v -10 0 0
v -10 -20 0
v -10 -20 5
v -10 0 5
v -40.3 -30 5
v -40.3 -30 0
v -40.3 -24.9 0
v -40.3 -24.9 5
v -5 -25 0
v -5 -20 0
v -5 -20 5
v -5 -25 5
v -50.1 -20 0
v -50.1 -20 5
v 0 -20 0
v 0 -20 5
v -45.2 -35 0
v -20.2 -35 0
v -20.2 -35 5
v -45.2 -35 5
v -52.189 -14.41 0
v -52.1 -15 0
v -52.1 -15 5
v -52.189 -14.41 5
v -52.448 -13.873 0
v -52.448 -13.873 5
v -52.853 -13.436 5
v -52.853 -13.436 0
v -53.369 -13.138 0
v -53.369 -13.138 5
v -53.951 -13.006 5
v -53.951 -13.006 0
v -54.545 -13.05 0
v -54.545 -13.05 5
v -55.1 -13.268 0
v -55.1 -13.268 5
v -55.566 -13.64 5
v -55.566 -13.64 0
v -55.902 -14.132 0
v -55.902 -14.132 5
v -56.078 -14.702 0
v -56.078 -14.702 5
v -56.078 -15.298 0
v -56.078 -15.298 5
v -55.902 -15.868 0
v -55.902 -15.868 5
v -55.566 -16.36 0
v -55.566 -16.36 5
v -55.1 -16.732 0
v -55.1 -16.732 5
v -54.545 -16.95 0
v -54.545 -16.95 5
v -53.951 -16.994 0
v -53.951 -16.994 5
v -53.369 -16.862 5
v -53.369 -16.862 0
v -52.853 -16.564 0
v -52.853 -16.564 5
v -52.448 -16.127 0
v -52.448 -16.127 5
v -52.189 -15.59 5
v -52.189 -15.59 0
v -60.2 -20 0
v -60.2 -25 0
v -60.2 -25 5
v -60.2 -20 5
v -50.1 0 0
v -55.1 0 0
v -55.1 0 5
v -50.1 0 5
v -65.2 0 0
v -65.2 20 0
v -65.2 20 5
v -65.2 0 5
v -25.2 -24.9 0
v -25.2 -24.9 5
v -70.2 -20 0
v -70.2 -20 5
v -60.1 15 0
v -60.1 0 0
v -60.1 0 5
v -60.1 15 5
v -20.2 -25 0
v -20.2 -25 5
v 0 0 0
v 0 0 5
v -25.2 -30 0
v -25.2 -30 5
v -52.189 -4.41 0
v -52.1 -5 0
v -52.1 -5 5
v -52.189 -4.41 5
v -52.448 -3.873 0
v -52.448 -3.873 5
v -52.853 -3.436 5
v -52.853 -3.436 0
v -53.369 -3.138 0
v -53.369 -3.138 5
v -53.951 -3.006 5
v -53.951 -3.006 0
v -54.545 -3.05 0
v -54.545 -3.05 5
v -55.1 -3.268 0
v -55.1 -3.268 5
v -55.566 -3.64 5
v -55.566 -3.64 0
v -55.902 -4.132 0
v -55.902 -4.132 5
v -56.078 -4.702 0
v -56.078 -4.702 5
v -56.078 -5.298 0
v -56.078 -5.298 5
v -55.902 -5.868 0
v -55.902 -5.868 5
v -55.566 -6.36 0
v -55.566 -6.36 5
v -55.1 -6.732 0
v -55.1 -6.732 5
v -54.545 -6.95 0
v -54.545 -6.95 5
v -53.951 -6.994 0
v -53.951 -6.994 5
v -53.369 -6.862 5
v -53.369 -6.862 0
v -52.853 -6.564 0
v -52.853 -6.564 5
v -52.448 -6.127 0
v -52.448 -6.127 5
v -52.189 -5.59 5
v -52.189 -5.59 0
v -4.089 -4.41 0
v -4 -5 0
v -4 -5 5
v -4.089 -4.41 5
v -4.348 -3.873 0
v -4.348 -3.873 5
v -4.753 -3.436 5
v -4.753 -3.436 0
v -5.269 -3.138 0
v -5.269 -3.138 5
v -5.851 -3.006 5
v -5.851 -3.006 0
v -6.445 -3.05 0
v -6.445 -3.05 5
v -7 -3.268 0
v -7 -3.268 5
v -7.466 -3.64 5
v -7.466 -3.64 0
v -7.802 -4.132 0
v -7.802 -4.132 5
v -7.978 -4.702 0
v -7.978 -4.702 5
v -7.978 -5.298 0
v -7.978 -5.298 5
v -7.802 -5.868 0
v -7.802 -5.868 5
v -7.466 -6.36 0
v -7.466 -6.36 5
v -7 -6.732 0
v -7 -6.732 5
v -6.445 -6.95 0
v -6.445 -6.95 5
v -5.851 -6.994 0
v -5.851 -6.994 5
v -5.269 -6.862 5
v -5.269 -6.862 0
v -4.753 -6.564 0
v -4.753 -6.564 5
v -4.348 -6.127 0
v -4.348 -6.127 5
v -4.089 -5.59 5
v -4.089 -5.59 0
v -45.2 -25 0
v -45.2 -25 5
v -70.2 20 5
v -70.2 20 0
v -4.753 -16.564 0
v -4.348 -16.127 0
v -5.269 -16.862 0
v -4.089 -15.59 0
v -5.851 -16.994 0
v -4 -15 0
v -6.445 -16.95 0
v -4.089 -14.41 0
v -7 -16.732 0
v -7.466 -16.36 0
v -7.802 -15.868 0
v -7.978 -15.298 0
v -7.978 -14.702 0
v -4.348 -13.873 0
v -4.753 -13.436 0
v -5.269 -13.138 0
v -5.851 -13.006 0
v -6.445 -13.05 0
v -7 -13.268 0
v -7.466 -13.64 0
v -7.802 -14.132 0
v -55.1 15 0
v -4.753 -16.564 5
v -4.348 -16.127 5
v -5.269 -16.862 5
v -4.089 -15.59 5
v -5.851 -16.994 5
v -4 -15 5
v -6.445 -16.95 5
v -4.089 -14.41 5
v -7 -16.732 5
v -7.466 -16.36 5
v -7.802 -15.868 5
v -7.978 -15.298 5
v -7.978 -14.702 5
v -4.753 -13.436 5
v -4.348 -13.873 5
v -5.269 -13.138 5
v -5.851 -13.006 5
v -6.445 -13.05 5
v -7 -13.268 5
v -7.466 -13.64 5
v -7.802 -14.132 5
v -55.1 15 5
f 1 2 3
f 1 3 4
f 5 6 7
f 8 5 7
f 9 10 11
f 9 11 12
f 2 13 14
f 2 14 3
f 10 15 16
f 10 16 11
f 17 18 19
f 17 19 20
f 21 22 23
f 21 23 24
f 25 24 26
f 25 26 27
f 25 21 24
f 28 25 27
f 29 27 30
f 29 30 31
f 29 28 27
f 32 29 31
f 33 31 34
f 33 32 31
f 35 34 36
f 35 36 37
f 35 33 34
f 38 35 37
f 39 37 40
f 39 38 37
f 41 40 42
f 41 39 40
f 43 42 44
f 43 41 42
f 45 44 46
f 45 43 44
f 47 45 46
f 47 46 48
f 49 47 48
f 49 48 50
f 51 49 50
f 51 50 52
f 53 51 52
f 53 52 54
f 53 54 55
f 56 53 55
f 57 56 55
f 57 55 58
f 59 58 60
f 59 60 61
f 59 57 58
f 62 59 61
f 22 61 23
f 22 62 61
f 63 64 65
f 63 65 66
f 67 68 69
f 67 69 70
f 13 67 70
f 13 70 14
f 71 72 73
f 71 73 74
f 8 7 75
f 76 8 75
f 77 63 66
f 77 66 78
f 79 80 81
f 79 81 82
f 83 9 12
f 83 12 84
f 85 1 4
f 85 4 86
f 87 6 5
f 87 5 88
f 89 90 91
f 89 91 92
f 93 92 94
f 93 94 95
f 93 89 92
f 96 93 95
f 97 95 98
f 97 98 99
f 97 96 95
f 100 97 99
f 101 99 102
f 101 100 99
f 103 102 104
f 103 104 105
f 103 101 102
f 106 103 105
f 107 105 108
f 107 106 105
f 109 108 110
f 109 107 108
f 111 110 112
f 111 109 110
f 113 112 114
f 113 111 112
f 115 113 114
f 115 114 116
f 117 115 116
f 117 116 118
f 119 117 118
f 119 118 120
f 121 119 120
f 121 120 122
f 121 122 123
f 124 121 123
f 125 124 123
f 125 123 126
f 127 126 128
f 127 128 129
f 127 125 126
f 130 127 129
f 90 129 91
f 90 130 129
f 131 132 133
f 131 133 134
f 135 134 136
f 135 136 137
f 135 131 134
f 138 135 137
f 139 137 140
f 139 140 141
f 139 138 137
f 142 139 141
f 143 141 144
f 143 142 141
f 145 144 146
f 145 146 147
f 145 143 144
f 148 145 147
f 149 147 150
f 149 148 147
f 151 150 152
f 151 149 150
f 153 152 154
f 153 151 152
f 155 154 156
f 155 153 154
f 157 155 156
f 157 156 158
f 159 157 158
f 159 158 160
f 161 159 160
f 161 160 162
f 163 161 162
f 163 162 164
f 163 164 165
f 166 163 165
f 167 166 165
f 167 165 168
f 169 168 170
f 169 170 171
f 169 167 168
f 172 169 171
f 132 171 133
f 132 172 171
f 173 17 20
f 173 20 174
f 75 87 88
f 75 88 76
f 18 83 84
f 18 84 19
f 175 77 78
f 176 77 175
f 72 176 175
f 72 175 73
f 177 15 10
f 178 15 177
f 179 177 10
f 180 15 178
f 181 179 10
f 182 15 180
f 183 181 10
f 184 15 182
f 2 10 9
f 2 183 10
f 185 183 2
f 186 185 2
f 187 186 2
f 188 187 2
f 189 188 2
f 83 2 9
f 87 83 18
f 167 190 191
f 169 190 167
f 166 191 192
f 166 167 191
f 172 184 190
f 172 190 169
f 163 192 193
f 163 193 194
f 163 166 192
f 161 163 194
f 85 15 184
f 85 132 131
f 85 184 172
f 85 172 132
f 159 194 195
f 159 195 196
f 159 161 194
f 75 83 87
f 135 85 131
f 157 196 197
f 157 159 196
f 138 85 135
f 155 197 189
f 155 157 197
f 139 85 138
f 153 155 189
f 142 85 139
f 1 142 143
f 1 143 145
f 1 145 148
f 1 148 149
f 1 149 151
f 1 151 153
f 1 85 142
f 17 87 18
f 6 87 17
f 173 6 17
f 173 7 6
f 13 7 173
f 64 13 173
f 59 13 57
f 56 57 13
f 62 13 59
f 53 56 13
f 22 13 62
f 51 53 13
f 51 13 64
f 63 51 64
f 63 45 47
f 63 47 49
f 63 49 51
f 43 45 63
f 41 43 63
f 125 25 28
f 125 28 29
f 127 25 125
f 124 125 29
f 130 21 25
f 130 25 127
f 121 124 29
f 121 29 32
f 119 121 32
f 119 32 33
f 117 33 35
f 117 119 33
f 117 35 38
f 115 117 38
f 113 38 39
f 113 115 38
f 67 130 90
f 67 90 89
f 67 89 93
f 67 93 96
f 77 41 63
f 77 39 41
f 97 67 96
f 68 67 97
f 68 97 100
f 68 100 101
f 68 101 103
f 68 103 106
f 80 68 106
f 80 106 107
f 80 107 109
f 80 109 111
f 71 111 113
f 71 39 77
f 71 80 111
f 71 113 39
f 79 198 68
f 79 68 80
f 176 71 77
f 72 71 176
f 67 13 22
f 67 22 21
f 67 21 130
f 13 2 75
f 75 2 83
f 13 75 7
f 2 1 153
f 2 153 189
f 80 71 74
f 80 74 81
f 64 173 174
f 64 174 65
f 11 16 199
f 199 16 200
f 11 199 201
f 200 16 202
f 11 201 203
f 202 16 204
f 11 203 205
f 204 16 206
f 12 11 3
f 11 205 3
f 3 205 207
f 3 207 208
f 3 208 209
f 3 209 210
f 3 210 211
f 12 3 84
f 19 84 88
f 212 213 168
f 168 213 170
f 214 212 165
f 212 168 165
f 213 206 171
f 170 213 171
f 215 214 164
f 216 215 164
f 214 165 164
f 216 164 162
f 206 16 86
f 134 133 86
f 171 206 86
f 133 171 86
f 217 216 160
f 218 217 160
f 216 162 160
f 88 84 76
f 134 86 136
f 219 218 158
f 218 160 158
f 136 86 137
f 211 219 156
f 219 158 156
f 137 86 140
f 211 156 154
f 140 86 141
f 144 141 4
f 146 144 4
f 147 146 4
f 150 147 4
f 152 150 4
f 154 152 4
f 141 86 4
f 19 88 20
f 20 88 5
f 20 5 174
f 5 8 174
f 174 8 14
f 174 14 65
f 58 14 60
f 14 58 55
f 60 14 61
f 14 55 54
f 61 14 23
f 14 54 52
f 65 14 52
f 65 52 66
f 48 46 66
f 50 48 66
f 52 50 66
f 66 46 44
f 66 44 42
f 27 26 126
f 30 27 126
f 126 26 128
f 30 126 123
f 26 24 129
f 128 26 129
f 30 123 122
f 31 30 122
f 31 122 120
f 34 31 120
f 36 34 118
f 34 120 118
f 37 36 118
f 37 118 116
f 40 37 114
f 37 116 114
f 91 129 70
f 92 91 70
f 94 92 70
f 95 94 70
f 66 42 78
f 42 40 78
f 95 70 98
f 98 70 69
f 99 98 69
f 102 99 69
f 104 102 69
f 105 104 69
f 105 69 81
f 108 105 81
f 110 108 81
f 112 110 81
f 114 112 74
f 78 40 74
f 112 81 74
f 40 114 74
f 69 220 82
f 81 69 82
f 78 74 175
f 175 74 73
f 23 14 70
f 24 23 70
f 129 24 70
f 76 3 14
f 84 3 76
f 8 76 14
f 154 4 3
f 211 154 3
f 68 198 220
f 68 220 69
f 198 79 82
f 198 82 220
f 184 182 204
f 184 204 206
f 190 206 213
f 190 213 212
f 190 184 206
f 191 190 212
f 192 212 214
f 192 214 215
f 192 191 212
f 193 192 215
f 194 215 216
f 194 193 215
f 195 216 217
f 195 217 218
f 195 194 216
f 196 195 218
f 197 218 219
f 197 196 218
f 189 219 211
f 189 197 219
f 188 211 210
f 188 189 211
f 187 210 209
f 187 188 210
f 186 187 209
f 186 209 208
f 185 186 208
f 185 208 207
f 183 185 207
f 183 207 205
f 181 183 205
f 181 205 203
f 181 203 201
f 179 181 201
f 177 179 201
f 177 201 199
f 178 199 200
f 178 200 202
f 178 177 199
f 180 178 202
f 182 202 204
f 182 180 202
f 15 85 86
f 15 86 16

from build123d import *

# Parameters (mm, degrees)
SKETCH1_R           = 2
SKETCH1_W           = 15.1
SKETCH1_H           = 5.1
BOSS_EXTRUDE1_DEPTH = 5


with BuildPart() as part:
    # Sketch1 → Boss-Extrude1 (new body)
    with BuildSketch(Plane.XY):
        Polygon((-70.2, 20), (-65.2, 20), (-65.2, 0), (-60.1, 0), (-60.1, 15), (-55.1, 15), (-55.1, 0), (-50.1, 0), (-50.1, -20), (-10, -20), (-10, 0), (0, 0), (0, -20), (-5, -20), (-5, -25), (-20.2, -25), (-20.2, -35), (-45.2, -35), (-45.2, -25), (-60.2, -25), (-60.2, -20), (-70.2, -20), align=None)
        with Locations((-54.1, -5)):
            Circle(SKETCH1_R, mode=Mode.SUBTRACT)
        with Locations((-54.1, -15)):
            Circle(SKETCH1_R, mode=Mode.SUBTRACT)
        with Locations((-6, -5)):
            Circle(SKETCH1_R, mode=Mode.SUBTRACT)
        with Locations((-6, -15)):
            Circle(SKETCH1_R, mode=Mode.SUBTRACT)
        with Locations((-32.75, -27.45)):
            Rectangle(SKETCH1_W, SKETCH1_H, mode=Mode.SUBTRACT)
    extrude(amount=BOSS_EXTRUDE1_DEPTH)


solid = part.part
